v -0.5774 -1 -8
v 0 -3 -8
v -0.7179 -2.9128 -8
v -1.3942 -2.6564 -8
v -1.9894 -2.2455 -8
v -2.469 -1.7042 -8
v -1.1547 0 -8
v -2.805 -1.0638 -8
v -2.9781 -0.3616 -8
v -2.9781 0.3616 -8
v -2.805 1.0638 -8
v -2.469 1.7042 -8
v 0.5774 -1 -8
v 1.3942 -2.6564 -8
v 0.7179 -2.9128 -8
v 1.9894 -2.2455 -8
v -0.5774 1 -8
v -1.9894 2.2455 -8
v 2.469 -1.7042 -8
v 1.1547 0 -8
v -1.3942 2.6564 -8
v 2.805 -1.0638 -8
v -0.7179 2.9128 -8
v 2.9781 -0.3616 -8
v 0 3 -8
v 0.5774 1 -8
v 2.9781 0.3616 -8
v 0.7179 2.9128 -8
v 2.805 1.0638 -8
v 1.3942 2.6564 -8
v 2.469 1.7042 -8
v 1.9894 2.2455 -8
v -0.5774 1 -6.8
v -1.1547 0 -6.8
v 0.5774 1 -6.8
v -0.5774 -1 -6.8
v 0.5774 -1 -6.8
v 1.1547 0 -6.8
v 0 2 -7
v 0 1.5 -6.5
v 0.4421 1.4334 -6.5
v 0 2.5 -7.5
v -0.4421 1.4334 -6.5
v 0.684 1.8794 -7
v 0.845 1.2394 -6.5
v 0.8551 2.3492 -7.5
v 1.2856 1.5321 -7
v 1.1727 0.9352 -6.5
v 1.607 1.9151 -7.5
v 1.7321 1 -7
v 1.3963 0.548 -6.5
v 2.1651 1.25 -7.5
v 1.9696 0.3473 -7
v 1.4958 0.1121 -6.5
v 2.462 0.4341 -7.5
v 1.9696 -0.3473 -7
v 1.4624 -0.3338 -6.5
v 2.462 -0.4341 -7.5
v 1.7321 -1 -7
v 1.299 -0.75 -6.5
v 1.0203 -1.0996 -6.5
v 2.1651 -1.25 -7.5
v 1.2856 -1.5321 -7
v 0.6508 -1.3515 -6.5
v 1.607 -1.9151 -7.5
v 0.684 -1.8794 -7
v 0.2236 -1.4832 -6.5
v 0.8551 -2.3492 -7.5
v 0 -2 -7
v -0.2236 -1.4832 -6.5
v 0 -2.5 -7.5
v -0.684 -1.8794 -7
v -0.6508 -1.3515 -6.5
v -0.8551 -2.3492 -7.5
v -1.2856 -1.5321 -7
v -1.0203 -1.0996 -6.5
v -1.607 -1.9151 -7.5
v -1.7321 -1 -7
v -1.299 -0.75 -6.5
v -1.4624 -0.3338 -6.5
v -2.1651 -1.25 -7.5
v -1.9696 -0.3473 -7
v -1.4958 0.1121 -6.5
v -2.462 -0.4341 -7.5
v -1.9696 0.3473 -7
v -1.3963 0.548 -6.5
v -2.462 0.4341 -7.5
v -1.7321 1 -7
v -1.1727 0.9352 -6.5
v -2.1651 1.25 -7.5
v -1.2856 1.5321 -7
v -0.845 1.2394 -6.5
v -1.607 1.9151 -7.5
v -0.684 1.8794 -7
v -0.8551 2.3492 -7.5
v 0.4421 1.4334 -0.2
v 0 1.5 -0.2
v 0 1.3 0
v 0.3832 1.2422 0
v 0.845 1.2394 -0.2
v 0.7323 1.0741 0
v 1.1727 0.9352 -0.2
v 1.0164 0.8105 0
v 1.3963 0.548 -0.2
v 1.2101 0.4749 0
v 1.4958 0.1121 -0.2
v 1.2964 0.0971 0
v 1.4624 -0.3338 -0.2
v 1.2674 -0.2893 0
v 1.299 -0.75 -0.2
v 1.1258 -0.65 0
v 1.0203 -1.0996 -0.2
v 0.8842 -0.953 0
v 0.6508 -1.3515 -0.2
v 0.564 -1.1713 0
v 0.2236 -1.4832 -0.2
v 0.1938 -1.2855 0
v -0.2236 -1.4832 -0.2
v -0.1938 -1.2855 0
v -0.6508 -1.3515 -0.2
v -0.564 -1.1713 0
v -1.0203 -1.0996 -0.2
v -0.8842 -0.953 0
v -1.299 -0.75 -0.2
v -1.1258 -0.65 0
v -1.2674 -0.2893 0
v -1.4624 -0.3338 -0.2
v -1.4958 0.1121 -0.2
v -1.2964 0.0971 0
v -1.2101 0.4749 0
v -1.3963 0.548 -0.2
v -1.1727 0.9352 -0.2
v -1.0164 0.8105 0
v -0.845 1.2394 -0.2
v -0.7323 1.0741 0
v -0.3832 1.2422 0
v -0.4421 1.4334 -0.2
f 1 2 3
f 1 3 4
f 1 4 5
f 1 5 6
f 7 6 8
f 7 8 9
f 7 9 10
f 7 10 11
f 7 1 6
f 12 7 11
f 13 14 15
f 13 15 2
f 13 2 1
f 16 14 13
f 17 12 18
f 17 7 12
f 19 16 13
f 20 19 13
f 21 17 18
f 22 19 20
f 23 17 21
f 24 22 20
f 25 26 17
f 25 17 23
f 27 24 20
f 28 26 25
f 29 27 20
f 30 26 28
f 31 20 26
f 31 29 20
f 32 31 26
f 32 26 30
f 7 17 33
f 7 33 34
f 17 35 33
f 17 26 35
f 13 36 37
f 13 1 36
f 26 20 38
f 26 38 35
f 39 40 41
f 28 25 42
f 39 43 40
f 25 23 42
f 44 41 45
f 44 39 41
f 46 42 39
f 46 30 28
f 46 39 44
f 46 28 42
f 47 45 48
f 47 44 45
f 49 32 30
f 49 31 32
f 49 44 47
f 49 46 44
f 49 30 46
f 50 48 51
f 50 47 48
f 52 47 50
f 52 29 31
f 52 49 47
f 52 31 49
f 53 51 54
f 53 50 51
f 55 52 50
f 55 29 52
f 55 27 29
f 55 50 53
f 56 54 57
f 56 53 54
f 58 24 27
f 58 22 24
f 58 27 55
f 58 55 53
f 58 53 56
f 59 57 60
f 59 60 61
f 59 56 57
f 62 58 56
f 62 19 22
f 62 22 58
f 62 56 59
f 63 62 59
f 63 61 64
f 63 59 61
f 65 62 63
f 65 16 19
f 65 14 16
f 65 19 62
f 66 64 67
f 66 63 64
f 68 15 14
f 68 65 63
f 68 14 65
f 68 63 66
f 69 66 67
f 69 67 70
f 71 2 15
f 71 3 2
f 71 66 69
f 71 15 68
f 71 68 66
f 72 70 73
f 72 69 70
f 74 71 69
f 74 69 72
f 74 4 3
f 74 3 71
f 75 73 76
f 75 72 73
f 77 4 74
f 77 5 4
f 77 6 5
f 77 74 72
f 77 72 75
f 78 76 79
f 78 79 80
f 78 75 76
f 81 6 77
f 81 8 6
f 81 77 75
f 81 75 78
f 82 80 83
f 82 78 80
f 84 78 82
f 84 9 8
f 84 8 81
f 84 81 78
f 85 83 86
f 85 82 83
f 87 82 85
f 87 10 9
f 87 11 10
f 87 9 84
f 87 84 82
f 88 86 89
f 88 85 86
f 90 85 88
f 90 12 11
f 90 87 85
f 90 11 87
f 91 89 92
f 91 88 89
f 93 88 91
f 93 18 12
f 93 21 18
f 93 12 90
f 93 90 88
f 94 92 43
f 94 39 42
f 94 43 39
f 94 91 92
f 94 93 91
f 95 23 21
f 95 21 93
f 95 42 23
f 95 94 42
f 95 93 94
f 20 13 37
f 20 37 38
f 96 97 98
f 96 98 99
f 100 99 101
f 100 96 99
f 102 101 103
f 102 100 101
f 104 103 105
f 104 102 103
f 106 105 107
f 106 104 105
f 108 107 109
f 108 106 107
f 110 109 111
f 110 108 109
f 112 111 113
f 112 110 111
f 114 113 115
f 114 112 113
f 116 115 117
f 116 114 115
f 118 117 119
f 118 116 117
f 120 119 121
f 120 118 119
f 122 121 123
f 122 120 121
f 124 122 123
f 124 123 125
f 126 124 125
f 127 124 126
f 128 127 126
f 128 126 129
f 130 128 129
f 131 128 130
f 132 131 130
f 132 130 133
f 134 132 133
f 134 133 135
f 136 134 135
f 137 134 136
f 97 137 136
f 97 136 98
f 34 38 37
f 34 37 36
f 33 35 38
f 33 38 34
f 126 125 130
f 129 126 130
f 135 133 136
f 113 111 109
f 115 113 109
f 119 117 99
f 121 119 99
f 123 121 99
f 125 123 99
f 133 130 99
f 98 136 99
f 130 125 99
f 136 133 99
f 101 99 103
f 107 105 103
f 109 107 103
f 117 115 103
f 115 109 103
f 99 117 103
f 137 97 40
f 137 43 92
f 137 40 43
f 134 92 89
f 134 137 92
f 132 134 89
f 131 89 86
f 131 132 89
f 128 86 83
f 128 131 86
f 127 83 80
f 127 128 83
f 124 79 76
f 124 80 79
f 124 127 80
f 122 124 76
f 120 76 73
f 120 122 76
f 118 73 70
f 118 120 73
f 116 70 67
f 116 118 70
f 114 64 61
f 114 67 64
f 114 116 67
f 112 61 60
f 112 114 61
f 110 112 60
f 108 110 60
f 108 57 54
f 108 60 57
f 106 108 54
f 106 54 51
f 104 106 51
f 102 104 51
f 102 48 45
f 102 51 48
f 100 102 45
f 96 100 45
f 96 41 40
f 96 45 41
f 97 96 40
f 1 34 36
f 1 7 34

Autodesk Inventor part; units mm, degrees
ref_plane "YZ Plane" through (0, 0, 0) normal (1, 0, 0) x (0, 1, 0)
ref_plane "XZ Plane" through (0, 0, 0) normal (0, 1, 0) x (-1, 0, 0)
ref_plane "XY Plane" through (0, 0, 0) normal (0, 0, 1) x (1, 0, 0)
sketch "Sketch4" plane through (0, 0, 0) normal (1, 0, 0) x (0, 1, 0)
  line L0 (0, 0) -> (0, -8)
  line L1 (0, -8) -> (3, -8)
  line L2 (3, -8) -> (1.5, -6.5)
  line L3 (1.5, -6.5) -> (1.5, 0)
  line L4 (1.5, 0) -> (0, 0)
  dimension "d11" = 6
  dimension "d12" = 3
  dimension "d15" = 8
  dimension "d16" = 45
revolve "Revolution1" add sketch "Sketch4" angle 360 about axis through (0, 0, 0) along (0, 0, -1)
sketch "Sketch5" plane through (0, 0, -8) normal (0, 0, -1) x (-1, 0, 0)
  line L0 (1.1547, 0) -> (0.5774, -1)
  line L1 (0.5774, -1) -> (-0.5774, -1)
  line L2 (-0.5774, -1) -> (-1.1547, 0)
  line L3 (-1.1547, 0) -> (-0.5774, 1)
  line L4 (-0.5774, 1) -> (0.5774, 1)
  line L5 (0.5774, 1) -> (1.1547, 0)
  point P0 (0, 0)
  point P1 (0, 0)
  dimension "d18" = 2
extrude "Extrusion5" cut sketch "Sketch5" against normal blind 1.2
chamfer "Chamfer2" distance 0.2 angle 45 1 edges at (0, -1.5, 0)
thread "Thread1" size "M3x0.5" class "6g" standard "ANSI Metric M Profile" full length
properties part number "M3 x 8mm FHCS" material "Stainless Steel"
